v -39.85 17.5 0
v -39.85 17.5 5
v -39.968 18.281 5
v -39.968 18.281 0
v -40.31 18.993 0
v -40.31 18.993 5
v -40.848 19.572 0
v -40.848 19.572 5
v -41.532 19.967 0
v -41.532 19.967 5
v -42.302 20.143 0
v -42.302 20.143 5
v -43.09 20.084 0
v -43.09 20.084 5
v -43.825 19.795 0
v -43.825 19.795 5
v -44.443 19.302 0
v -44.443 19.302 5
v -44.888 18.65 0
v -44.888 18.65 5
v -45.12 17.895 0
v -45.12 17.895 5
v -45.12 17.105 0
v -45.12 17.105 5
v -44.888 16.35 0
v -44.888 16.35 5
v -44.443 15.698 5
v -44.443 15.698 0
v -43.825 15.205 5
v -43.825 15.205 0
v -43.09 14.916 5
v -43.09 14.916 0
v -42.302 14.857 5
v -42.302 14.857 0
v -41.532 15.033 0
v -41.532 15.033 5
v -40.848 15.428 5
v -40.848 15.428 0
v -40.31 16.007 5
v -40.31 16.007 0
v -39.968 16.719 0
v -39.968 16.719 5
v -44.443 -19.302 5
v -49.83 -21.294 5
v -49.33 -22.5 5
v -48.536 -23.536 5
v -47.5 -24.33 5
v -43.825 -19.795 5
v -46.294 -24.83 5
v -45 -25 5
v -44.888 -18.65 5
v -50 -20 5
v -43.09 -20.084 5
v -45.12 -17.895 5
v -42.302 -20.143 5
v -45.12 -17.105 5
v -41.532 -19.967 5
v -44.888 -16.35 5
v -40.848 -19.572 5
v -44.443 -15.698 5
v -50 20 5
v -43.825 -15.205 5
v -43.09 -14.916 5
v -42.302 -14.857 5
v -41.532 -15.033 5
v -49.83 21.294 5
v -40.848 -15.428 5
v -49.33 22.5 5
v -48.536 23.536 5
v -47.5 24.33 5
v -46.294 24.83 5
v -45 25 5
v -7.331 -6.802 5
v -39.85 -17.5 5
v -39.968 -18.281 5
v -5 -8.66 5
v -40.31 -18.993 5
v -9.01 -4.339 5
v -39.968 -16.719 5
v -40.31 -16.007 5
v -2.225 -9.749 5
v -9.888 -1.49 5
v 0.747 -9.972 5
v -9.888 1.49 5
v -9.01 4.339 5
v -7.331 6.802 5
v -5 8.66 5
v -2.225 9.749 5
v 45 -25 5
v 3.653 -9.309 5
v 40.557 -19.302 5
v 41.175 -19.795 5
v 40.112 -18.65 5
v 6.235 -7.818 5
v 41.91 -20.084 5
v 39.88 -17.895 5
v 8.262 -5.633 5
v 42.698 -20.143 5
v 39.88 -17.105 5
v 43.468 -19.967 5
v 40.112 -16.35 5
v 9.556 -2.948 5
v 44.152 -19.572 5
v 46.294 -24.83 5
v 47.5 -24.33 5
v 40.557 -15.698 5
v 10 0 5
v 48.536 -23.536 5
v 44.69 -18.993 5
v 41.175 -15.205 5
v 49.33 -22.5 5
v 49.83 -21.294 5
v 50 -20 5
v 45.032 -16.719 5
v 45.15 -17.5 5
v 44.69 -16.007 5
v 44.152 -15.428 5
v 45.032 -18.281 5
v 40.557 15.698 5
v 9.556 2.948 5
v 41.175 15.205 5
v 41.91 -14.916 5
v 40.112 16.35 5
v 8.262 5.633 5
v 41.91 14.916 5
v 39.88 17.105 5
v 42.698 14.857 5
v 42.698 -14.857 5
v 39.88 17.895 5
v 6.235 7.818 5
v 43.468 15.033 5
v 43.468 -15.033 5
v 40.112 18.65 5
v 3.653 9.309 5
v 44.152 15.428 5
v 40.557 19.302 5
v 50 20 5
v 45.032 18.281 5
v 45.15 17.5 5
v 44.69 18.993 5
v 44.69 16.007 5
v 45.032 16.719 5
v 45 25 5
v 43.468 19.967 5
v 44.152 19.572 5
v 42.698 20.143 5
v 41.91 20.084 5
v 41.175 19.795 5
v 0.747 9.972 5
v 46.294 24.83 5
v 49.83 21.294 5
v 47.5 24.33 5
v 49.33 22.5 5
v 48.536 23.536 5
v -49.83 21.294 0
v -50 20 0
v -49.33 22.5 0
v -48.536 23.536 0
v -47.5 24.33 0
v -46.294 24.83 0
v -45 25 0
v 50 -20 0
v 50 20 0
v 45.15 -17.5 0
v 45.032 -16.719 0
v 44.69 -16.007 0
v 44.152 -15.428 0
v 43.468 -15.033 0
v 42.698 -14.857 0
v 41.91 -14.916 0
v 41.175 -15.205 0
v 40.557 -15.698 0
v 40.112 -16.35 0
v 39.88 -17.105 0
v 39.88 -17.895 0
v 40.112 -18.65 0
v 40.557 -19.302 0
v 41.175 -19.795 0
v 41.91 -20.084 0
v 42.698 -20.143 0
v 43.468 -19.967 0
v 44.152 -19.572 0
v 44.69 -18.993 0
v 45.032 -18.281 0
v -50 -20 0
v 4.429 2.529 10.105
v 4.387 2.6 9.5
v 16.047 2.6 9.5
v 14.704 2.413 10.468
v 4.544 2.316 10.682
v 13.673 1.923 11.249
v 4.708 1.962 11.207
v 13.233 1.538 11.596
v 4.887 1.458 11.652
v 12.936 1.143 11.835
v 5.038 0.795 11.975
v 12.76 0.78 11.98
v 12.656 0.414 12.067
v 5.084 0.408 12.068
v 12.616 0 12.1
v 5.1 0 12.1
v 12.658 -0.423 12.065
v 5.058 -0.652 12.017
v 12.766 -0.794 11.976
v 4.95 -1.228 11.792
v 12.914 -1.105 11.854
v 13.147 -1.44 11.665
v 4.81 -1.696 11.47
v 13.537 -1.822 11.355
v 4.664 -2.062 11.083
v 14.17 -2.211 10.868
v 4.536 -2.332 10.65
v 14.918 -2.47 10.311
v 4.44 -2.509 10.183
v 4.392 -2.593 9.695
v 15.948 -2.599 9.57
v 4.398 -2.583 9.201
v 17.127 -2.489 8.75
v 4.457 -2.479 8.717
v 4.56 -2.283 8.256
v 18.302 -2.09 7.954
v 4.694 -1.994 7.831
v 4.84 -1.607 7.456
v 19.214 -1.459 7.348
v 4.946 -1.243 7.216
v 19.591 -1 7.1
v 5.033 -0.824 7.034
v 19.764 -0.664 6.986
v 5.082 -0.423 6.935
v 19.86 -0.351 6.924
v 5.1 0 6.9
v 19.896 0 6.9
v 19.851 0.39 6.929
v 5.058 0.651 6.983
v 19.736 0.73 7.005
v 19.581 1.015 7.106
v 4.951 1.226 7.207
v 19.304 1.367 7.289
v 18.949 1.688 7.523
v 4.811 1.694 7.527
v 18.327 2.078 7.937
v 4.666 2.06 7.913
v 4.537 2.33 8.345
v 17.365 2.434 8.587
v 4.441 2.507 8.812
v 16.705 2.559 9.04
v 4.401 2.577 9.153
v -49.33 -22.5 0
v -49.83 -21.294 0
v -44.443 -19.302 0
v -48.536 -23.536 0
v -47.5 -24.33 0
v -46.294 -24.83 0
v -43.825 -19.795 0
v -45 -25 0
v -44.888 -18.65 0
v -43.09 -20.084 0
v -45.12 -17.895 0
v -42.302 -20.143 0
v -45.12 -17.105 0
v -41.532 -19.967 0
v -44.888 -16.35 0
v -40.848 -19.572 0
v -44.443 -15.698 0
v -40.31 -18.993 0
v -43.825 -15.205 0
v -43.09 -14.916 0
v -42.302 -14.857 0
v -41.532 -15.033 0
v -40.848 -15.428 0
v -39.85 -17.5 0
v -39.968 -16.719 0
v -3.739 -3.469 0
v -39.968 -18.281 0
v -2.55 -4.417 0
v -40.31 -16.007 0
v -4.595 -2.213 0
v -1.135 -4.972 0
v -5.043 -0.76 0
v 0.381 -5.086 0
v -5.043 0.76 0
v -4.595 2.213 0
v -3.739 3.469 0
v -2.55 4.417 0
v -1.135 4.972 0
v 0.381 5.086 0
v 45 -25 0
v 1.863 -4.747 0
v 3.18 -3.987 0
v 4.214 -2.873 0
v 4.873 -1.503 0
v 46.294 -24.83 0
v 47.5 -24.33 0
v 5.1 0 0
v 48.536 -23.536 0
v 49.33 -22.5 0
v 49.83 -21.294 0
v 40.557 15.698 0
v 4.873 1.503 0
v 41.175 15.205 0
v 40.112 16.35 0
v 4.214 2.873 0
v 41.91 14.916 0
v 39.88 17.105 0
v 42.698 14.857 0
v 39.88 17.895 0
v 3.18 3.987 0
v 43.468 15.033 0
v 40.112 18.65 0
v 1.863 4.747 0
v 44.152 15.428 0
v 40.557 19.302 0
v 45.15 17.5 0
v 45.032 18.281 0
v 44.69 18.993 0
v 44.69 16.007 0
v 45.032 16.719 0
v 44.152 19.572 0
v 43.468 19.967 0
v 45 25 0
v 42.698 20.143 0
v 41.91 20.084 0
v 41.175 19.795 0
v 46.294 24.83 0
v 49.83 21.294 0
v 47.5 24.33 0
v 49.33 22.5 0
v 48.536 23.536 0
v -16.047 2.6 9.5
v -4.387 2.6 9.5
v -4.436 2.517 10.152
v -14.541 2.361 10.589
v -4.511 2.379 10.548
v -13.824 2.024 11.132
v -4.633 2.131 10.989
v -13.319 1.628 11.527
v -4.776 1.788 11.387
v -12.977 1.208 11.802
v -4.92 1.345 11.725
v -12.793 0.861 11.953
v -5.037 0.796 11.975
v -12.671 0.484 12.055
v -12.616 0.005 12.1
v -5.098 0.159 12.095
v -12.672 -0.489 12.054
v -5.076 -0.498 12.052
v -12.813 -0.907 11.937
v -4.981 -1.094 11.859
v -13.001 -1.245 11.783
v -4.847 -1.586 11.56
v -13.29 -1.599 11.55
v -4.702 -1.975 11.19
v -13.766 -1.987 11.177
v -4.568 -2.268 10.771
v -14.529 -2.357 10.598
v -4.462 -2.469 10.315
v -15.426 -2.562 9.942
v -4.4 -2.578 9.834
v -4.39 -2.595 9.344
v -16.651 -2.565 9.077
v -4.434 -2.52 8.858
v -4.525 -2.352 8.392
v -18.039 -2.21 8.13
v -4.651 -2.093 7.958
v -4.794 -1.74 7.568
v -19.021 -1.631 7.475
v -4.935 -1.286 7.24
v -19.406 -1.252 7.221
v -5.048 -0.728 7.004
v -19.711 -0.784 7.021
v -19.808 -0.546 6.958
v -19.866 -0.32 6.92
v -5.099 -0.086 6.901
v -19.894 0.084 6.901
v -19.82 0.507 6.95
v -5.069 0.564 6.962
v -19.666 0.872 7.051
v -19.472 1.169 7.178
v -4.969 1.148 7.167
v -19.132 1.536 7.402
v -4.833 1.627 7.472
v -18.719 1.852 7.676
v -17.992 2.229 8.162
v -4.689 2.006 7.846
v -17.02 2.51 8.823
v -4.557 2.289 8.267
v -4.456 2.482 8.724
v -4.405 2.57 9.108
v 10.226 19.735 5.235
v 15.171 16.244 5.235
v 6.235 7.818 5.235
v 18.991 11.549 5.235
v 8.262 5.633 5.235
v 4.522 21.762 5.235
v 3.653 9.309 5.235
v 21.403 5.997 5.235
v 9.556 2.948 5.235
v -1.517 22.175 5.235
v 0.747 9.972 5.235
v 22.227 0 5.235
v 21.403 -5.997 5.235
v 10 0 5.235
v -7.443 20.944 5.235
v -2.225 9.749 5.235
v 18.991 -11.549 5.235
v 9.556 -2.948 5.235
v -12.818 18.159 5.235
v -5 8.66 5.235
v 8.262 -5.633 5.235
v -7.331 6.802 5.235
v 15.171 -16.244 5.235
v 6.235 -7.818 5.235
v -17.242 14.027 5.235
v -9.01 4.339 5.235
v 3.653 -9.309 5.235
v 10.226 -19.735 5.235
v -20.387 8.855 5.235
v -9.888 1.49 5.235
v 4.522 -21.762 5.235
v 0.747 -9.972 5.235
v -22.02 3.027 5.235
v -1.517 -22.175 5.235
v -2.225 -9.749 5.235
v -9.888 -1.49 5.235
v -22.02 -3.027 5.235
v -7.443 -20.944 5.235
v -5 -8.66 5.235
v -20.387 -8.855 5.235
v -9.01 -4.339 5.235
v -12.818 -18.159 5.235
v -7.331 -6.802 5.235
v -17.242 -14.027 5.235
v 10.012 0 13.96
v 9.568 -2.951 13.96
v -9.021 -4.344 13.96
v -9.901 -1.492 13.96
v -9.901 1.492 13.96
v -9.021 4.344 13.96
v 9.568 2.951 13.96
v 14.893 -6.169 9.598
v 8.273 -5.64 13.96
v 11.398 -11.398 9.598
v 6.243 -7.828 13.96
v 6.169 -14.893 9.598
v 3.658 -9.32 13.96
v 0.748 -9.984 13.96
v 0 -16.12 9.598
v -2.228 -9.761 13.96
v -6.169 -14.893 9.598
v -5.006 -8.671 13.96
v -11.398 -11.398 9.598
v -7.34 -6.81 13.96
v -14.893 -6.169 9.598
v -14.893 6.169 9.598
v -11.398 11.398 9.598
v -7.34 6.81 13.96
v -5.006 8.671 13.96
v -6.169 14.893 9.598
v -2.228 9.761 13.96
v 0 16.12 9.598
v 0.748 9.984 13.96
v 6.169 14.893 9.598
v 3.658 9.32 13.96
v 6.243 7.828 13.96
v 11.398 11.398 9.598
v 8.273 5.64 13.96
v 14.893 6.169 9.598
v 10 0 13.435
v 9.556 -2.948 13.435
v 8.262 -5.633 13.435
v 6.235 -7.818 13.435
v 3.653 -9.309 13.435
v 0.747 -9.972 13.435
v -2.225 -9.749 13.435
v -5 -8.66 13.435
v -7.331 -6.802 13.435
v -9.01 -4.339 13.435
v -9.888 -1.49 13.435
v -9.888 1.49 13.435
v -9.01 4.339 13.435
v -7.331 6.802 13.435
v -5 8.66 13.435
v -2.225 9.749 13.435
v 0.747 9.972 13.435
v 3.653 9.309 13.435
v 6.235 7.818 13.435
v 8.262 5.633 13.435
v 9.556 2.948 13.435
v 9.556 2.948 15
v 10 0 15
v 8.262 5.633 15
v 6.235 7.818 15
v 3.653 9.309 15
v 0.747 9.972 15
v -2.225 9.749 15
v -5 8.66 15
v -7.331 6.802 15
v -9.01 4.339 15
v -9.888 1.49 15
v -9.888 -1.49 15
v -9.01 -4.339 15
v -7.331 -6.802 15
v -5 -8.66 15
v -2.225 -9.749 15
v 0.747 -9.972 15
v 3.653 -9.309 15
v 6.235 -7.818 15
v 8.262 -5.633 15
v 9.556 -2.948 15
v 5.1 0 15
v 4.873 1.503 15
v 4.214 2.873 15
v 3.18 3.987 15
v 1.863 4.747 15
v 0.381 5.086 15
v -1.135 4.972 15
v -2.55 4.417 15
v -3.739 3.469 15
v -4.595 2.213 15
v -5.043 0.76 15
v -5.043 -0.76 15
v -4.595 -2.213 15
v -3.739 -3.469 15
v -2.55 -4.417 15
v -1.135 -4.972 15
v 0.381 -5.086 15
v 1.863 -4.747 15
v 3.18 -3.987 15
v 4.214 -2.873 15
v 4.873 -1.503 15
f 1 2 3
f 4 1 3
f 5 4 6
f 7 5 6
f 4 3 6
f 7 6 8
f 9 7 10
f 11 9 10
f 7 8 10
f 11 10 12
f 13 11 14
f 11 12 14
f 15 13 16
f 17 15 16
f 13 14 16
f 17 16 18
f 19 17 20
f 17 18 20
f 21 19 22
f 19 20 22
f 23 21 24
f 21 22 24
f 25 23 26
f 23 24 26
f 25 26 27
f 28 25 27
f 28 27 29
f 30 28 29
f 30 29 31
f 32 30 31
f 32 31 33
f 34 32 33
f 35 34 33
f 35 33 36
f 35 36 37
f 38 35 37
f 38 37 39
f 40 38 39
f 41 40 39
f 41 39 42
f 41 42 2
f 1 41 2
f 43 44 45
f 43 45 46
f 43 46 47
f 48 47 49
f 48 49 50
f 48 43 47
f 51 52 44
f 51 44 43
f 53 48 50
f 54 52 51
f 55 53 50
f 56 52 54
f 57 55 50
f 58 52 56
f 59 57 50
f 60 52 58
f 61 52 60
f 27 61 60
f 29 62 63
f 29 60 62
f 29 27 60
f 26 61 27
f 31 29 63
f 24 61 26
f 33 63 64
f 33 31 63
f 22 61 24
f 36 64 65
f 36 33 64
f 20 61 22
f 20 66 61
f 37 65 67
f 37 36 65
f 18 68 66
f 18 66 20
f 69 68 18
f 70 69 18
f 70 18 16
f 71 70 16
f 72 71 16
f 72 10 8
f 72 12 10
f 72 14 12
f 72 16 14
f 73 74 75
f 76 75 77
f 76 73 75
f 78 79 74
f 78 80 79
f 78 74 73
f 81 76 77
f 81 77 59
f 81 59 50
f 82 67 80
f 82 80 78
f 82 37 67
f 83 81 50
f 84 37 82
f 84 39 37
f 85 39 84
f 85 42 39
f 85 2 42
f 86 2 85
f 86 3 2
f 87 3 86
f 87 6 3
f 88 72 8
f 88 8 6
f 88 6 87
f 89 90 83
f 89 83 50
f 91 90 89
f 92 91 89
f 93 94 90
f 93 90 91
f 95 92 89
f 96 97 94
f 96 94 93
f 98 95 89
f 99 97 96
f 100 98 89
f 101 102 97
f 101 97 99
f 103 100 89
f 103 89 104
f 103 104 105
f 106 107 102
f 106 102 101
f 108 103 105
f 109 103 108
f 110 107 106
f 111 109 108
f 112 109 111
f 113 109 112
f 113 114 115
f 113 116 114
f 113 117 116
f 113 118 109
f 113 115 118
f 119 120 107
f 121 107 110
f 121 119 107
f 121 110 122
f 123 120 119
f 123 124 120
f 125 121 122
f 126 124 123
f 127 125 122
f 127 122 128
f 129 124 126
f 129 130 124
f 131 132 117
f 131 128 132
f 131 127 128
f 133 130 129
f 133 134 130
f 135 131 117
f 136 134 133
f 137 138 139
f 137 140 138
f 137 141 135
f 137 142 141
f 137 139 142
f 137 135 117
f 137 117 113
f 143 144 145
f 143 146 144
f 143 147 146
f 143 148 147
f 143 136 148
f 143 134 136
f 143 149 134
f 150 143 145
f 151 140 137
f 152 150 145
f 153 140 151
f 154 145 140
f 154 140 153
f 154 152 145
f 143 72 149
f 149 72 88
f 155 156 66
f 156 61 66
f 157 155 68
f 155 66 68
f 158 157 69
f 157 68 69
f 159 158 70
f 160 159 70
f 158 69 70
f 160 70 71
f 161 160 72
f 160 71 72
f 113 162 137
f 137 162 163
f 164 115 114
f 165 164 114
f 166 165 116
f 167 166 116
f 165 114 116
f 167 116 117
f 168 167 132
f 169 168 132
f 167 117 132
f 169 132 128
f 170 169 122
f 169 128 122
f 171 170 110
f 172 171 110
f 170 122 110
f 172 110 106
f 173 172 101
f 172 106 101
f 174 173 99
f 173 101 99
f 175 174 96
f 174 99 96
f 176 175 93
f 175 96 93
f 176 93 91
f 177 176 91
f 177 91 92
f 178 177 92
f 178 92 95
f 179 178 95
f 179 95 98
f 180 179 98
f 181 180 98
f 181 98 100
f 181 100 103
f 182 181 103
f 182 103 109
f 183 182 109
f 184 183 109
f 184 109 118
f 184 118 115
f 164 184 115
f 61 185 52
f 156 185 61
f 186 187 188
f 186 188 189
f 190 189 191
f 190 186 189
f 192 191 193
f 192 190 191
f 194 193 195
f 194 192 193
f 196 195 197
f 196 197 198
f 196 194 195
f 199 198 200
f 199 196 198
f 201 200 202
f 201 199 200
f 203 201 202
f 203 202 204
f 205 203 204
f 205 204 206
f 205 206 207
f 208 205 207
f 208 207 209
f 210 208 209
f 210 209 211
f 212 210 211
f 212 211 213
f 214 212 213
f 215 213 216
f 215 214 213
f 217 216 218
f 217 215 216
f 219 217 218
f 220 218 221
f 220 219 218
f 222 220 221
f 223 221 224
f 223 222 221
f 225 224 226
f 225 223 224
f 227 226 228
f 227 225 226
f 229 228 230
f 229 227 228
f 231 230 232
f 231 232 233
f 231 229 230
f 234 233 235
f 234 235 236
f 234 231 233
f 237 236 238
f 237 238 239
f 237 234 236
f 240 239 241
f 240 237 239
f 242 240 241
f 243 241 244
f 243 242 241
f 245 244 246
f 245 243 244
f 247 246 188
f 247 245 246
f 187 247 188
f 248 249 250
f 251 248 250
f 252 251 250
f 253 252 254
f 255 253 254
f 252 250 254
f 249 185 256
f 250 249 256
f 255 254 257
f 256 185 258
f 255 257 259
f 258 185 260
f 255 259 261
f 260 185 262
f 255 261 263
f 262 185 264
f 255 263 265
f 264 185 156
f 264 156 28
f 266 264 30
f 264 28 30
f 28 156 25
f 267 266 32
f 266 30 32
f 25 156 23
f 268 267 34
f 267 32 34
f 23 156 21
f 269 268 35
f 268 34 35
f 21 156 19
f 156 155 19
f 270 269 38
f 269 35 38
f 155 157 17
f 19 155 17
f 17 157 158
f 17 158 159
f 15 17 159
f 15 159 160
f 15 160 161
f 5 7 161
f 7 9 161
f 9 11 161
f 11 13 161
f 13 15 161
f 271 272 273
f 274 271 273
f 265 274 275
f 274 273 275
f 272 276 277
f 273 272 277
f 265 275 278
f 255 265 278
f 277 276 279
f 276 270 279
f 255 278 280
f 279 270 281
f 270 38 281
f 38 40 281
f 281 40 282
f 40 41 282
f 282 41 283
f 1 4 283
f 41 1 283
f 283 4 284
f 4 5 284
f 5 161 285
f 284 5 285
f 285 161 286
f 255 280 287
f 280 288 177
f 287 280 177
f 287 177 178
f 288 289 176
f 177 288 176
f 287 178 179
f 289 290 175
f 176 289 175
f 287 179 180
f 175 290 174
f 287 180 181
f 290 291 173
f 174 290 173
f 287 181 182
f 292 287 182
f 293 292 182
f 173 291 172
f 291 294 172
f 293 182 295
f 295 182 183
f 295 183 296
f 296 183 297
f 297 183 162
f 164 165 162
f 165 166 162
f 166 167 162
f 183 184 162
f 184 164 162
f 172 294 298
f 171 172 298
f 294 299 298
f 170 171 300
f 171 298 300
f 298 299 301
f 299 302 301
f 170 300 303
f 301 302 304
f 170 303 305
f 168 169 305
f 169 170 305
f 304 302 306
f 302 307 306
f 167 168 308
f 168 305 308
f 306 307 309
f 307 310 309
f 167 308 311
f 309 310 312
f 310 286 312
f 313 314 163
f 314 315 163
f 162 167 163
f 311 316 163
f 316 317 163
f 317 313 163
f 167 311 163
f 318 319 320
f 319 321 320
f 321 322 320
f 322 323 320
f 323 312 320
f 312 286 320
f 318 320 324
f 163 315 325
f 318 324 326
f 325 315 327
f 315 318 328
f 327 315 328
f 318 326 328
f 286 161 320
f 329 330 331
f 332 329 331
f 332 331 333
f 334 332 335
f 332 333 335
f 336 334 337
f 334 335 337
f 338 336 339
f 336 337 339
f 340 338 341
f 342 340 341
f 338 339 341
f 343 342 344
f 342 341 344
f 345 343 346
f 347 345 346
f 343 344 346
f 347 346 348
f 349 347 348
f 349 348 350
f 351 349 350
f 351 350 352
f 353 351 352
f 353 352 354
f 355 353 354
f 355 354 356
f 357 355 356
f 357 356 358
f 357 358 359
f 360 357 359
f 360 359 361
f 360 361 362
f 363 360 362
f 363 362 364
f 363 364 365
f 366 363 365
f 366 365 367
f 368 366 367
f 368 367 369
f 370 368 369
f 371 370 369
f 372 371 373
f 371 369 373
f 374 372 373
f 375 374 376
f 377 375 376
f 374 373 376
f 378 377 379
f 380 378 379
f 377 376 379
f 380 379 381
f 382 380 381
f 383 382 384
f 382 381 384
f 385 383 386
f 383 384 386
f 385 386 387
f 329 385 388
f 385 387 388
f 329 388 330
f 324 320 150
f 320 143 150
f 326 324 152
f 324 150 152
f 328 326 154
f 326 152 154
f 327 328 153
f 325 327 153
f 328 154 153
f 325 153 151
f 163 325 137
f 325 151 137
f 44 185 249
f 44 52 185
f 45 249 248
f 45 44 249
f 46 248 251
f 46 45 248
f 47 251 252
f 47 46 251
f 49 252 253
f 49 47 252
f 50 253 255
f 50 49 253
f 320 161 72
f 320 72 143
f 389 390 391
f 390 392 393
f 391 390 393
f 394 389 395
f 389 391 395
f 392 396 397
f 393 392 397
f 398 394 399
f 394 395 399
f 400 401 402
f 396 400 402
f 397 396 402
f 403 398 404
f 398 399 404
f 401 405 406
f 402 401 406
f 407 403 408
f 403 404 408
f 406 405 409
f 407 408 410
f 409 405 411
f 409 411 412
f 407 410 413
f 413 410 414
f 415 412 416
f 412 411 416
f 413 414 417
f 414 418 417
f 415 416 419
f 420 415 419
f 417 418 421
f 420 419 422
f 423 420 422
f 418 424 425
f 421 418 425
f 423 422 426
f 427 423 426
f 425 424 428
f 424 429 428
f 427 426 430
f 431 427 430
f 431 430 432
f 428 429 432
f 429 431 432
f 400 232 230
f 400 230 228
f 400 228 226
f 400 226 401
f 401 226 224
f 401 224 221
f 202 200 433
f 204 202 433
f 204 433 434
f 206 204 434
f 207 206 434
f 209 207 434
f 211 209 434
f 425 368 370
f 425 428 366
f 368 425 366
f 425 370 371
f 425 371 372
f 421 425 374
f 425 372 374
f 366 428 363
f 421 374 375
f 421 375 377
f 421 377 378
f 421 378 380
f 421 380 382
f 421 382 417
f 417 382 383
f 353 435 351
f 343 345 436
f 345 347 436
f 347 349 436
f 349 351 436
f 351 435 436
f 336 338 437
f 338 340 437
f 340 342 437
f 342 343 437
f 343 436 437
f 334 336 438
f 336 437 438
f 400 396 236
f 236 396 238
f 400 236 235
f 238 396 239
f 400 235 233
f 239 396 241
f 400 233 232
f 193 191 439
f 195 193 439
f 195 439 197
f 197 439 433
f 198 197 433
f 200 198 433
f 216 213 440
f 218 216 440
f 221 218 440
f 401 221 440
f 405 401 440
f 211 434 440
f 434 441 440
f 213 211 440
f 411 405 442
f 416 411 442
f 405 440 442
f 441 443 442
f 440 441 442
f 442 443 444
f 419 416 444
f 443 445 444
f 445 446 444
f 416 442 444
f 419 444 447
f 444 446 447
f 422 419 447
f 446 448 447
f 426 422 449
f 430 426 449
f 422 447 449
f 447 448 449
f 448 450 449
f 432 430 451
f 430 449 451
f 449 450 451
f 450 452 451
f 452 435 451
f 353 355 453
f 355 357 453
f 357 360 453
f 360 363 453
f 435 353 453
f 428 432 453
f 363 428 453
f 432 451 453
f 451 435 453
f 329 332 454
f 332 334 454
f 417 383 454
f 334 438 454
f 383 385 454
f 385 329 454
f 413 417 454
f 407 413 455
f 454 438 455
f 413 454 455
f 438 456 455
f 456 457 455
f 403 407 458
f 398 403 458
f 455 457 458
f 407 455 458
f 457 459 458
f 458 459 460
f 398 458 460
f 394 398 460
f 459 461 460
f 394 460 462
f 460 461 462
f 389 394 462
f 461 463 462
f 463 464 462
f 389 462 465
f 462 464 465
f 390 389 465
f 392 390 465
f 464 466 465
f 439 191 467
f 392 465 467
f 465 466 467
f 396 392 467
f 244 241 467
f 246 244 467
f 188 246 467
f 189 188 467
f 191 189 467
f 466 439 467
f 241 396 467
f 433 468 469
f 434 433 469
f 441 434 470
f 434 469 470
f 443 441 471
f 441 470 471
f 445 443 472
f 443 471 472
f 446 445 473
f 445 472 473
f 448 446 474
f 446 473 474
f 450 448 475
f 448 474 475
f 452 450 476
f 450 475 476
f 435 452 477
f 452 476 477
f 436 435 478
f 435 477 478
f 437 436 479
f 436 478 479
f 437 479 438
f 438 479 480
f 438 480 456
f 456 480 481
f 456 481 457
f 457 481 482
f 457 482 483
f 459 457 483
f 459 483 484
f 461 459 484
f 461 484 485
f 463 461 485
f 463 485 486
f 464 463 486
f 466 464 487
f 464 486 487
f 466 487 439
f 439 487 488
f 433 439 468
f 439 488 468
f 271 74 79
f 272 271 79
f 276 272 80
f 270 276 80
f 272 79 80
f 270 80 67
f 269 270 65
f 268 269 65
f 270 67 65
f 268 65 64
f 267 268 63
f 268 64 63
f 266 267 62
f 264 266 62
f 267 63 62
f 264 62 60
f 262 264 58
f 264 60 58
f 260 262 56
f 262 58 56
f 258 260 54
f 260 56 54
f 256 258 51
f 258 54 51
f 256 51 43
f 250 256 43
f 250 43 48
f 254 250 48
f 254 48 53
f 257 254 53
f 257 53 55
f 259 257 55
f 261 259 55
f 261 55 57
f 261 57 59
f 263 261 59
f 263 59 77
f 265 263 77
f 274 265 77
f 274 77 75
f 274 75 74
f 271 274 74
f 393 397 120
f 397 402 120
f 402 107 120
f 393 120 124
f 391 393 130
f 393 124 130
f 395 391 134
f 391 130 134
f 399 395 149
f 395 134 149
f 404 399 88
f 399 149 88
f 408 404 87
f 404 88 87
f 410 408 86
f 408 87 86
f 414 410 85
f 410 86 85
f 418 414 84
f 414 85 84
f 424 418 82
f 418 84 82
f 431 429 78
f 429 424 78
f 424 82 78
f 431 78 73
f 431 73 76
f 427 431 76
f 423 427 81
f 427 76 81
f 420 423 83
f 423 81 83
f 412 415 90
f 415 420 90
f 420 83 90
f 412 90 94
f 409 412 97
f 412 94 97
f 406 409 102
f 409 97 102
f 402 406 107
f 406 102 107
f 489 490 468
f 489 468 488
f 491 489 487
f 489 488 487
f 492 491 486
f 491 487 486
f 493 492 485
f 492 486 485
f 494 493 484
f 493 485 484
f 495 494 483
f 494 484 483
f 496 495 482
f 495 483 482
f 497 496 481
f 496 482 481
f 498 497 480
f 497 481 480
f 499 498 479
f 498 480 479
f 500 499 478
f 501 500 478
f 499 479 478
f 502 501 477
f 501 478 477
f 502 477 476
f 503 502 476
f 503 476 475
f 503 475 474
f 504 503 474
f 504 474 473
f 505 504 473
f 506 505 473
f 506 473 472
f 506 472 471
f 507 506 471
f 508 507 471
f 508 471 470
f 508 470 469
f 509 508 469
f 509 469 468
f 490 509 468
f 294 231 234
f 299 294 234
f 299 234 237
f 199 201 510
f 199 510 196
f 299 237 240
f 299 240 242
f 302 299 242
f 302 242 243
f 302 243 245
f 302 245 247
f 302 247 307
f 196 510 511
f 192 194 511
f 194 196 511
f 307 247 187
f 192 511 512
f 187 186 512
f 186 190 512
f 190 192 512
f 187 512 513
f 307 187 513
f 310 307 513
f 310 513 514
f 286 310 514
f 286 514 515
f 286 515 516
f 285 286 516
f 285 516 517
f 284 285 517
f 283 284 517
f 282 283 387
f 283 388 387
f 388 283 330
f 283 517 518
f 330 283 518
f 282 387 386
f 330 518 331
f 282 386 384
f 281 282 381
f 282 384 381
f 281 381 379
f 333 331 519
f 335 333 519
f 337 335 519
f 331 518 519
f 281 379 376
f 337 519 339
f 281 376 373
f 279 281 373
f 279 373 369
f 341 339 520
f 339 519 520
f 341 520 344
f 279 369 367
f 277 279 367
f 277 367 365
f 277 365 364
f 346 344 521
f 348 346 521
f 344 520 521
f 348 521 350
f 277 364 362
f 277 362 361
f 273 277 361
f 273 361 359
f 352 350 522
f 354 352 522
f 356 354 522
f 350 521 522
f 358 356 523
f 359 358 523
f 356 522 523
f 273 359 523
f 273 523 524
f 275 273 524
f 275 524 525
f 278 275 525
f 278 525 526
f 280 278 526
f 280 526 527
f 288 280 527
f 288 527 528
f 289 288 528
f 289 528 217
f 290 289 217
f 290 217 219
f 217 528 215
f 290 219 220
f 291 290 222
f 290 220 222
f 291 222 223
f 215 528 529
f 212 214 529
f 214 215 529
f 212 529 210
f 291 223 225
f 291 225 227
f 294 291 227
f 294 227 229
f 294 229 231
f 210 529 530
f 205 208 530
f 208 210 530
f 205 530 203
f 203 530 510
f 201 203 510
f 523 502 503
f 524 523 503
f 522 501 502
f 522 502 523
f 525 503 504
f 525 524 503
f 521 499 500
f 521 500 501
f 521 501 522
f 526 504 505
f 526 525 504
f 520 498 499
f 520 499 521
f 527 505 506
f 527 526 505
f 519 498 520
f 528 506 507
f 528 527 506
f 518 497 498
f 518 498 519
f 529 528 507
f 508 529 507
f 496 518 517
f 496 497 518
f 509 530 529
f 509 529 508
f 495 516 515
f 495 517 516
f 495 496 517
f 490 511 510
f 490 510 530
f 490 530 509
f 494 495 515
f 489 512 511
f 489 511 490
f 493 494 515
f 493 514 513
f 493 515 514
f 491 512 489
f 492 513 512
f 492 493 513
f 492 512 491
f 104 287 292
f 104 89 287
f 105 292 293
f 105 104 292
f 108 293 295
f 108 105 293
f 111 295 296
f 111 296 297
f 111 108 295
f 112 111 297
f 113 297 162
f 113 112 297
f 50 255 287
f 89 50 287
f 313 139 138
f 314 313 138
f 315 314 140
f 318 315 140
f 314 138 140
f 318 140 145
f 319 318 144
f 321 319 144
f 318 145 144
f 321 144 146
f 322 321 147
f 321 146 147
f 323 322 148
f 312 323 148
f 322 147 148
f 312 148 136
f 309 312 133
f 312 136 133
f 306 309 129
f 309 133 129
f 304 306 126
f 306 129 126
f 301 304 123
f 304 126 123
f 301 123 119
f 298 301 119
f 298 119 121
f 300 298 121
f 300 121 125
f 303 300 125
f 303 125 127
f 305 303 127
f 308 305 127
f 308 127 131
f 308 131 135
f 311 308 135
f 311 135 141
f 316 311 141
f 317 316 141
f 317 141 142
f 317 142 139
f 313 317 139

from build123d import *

# Parameters (mm, degrees)
F0_W           = 100
F0_H           = 50
F1_DEPTH       = 5
F2_R           = 10
F3_DEPTH       = 10
F4_R           = 5.1
F5_DEPTH       = 25
F6_R           = 5
F7_R           = 2.65
F8_DEPTH       = 25
F11_R          = 2.6
F12_DEPTH      = 25
F12_DEPTH_BACK = 25


with BuildPart() as f1:
    # F0 (on Top) → F1 (new body)
    with BuildSketch(Plane.XY):
        Rectangle(F0_W, F0_H)
    extrude(amount=F1_DEPTH)

    # F2 (on face) → F3 (join)
    with BuildSketch(Plane.XY.offset(5)):
        Circle(F2_R)
    extrude(amount=F3_DEPTH)

    # F4 (on face) → F5 (cut)
    with BuildSketch(Plane.XY.offset(15)):
        Circle(F4_R)
    extrude(amount=-F5_DEPTH, mode=Mode.SUBTRACT)

    # F6
    f6_edges = [f1.edges().sort_by_distance(p)[0] for p in [
        (-50, -25, 2.5),
        (-50, 25, 2.5),
        (50, 25, 2.5),
        (50, -25, 2.5),
    ]]
    fillet(f6_edges, radius=F6_R)

    # F7 (on face) → F8 (cut)
    with BuildSketch(Plane.XY.offset(5)):
        with Locations((42.5, 17.5)):
            Circle(F7_R)
        with Locations((42.5, -17.5)):
            Circle(F7_R)
        with Locations((-42.5, -17.5)):
            Circle(F7_R)
        with Locations((-42.5, 17.5)):
            Circle(F7_R)
    extrude(amount=-F8_DEPTH, mode=Mode.SUBTRACT)

    # F9 (on Front) → F10 (revolve)
    with BuildSketch(Plane.XZ):
        Polygon((22.2268737853, 5.2352962084), (10.0123630837, 13.9599470422), (9.8070763052, 5.2352962084), align=None)
    revolve(axis=Axis((0, 0, 5), (0, 0, -1)))

    # F11 (on Right) → F12 (cut, two sides)
    with BuildSketch(Plane.YZ) as f12_sk:
        with Locations((0, 9.5)):
            Circle(F11_R)
    extrude(amount=-F12_DEPTH, mode=Mode.SUBTRACT)
    extrude(f12_sk.sketch, amount=F12_DEPTH_BACK, mode=Mode.SUBTRACT)


solid = f1.part
